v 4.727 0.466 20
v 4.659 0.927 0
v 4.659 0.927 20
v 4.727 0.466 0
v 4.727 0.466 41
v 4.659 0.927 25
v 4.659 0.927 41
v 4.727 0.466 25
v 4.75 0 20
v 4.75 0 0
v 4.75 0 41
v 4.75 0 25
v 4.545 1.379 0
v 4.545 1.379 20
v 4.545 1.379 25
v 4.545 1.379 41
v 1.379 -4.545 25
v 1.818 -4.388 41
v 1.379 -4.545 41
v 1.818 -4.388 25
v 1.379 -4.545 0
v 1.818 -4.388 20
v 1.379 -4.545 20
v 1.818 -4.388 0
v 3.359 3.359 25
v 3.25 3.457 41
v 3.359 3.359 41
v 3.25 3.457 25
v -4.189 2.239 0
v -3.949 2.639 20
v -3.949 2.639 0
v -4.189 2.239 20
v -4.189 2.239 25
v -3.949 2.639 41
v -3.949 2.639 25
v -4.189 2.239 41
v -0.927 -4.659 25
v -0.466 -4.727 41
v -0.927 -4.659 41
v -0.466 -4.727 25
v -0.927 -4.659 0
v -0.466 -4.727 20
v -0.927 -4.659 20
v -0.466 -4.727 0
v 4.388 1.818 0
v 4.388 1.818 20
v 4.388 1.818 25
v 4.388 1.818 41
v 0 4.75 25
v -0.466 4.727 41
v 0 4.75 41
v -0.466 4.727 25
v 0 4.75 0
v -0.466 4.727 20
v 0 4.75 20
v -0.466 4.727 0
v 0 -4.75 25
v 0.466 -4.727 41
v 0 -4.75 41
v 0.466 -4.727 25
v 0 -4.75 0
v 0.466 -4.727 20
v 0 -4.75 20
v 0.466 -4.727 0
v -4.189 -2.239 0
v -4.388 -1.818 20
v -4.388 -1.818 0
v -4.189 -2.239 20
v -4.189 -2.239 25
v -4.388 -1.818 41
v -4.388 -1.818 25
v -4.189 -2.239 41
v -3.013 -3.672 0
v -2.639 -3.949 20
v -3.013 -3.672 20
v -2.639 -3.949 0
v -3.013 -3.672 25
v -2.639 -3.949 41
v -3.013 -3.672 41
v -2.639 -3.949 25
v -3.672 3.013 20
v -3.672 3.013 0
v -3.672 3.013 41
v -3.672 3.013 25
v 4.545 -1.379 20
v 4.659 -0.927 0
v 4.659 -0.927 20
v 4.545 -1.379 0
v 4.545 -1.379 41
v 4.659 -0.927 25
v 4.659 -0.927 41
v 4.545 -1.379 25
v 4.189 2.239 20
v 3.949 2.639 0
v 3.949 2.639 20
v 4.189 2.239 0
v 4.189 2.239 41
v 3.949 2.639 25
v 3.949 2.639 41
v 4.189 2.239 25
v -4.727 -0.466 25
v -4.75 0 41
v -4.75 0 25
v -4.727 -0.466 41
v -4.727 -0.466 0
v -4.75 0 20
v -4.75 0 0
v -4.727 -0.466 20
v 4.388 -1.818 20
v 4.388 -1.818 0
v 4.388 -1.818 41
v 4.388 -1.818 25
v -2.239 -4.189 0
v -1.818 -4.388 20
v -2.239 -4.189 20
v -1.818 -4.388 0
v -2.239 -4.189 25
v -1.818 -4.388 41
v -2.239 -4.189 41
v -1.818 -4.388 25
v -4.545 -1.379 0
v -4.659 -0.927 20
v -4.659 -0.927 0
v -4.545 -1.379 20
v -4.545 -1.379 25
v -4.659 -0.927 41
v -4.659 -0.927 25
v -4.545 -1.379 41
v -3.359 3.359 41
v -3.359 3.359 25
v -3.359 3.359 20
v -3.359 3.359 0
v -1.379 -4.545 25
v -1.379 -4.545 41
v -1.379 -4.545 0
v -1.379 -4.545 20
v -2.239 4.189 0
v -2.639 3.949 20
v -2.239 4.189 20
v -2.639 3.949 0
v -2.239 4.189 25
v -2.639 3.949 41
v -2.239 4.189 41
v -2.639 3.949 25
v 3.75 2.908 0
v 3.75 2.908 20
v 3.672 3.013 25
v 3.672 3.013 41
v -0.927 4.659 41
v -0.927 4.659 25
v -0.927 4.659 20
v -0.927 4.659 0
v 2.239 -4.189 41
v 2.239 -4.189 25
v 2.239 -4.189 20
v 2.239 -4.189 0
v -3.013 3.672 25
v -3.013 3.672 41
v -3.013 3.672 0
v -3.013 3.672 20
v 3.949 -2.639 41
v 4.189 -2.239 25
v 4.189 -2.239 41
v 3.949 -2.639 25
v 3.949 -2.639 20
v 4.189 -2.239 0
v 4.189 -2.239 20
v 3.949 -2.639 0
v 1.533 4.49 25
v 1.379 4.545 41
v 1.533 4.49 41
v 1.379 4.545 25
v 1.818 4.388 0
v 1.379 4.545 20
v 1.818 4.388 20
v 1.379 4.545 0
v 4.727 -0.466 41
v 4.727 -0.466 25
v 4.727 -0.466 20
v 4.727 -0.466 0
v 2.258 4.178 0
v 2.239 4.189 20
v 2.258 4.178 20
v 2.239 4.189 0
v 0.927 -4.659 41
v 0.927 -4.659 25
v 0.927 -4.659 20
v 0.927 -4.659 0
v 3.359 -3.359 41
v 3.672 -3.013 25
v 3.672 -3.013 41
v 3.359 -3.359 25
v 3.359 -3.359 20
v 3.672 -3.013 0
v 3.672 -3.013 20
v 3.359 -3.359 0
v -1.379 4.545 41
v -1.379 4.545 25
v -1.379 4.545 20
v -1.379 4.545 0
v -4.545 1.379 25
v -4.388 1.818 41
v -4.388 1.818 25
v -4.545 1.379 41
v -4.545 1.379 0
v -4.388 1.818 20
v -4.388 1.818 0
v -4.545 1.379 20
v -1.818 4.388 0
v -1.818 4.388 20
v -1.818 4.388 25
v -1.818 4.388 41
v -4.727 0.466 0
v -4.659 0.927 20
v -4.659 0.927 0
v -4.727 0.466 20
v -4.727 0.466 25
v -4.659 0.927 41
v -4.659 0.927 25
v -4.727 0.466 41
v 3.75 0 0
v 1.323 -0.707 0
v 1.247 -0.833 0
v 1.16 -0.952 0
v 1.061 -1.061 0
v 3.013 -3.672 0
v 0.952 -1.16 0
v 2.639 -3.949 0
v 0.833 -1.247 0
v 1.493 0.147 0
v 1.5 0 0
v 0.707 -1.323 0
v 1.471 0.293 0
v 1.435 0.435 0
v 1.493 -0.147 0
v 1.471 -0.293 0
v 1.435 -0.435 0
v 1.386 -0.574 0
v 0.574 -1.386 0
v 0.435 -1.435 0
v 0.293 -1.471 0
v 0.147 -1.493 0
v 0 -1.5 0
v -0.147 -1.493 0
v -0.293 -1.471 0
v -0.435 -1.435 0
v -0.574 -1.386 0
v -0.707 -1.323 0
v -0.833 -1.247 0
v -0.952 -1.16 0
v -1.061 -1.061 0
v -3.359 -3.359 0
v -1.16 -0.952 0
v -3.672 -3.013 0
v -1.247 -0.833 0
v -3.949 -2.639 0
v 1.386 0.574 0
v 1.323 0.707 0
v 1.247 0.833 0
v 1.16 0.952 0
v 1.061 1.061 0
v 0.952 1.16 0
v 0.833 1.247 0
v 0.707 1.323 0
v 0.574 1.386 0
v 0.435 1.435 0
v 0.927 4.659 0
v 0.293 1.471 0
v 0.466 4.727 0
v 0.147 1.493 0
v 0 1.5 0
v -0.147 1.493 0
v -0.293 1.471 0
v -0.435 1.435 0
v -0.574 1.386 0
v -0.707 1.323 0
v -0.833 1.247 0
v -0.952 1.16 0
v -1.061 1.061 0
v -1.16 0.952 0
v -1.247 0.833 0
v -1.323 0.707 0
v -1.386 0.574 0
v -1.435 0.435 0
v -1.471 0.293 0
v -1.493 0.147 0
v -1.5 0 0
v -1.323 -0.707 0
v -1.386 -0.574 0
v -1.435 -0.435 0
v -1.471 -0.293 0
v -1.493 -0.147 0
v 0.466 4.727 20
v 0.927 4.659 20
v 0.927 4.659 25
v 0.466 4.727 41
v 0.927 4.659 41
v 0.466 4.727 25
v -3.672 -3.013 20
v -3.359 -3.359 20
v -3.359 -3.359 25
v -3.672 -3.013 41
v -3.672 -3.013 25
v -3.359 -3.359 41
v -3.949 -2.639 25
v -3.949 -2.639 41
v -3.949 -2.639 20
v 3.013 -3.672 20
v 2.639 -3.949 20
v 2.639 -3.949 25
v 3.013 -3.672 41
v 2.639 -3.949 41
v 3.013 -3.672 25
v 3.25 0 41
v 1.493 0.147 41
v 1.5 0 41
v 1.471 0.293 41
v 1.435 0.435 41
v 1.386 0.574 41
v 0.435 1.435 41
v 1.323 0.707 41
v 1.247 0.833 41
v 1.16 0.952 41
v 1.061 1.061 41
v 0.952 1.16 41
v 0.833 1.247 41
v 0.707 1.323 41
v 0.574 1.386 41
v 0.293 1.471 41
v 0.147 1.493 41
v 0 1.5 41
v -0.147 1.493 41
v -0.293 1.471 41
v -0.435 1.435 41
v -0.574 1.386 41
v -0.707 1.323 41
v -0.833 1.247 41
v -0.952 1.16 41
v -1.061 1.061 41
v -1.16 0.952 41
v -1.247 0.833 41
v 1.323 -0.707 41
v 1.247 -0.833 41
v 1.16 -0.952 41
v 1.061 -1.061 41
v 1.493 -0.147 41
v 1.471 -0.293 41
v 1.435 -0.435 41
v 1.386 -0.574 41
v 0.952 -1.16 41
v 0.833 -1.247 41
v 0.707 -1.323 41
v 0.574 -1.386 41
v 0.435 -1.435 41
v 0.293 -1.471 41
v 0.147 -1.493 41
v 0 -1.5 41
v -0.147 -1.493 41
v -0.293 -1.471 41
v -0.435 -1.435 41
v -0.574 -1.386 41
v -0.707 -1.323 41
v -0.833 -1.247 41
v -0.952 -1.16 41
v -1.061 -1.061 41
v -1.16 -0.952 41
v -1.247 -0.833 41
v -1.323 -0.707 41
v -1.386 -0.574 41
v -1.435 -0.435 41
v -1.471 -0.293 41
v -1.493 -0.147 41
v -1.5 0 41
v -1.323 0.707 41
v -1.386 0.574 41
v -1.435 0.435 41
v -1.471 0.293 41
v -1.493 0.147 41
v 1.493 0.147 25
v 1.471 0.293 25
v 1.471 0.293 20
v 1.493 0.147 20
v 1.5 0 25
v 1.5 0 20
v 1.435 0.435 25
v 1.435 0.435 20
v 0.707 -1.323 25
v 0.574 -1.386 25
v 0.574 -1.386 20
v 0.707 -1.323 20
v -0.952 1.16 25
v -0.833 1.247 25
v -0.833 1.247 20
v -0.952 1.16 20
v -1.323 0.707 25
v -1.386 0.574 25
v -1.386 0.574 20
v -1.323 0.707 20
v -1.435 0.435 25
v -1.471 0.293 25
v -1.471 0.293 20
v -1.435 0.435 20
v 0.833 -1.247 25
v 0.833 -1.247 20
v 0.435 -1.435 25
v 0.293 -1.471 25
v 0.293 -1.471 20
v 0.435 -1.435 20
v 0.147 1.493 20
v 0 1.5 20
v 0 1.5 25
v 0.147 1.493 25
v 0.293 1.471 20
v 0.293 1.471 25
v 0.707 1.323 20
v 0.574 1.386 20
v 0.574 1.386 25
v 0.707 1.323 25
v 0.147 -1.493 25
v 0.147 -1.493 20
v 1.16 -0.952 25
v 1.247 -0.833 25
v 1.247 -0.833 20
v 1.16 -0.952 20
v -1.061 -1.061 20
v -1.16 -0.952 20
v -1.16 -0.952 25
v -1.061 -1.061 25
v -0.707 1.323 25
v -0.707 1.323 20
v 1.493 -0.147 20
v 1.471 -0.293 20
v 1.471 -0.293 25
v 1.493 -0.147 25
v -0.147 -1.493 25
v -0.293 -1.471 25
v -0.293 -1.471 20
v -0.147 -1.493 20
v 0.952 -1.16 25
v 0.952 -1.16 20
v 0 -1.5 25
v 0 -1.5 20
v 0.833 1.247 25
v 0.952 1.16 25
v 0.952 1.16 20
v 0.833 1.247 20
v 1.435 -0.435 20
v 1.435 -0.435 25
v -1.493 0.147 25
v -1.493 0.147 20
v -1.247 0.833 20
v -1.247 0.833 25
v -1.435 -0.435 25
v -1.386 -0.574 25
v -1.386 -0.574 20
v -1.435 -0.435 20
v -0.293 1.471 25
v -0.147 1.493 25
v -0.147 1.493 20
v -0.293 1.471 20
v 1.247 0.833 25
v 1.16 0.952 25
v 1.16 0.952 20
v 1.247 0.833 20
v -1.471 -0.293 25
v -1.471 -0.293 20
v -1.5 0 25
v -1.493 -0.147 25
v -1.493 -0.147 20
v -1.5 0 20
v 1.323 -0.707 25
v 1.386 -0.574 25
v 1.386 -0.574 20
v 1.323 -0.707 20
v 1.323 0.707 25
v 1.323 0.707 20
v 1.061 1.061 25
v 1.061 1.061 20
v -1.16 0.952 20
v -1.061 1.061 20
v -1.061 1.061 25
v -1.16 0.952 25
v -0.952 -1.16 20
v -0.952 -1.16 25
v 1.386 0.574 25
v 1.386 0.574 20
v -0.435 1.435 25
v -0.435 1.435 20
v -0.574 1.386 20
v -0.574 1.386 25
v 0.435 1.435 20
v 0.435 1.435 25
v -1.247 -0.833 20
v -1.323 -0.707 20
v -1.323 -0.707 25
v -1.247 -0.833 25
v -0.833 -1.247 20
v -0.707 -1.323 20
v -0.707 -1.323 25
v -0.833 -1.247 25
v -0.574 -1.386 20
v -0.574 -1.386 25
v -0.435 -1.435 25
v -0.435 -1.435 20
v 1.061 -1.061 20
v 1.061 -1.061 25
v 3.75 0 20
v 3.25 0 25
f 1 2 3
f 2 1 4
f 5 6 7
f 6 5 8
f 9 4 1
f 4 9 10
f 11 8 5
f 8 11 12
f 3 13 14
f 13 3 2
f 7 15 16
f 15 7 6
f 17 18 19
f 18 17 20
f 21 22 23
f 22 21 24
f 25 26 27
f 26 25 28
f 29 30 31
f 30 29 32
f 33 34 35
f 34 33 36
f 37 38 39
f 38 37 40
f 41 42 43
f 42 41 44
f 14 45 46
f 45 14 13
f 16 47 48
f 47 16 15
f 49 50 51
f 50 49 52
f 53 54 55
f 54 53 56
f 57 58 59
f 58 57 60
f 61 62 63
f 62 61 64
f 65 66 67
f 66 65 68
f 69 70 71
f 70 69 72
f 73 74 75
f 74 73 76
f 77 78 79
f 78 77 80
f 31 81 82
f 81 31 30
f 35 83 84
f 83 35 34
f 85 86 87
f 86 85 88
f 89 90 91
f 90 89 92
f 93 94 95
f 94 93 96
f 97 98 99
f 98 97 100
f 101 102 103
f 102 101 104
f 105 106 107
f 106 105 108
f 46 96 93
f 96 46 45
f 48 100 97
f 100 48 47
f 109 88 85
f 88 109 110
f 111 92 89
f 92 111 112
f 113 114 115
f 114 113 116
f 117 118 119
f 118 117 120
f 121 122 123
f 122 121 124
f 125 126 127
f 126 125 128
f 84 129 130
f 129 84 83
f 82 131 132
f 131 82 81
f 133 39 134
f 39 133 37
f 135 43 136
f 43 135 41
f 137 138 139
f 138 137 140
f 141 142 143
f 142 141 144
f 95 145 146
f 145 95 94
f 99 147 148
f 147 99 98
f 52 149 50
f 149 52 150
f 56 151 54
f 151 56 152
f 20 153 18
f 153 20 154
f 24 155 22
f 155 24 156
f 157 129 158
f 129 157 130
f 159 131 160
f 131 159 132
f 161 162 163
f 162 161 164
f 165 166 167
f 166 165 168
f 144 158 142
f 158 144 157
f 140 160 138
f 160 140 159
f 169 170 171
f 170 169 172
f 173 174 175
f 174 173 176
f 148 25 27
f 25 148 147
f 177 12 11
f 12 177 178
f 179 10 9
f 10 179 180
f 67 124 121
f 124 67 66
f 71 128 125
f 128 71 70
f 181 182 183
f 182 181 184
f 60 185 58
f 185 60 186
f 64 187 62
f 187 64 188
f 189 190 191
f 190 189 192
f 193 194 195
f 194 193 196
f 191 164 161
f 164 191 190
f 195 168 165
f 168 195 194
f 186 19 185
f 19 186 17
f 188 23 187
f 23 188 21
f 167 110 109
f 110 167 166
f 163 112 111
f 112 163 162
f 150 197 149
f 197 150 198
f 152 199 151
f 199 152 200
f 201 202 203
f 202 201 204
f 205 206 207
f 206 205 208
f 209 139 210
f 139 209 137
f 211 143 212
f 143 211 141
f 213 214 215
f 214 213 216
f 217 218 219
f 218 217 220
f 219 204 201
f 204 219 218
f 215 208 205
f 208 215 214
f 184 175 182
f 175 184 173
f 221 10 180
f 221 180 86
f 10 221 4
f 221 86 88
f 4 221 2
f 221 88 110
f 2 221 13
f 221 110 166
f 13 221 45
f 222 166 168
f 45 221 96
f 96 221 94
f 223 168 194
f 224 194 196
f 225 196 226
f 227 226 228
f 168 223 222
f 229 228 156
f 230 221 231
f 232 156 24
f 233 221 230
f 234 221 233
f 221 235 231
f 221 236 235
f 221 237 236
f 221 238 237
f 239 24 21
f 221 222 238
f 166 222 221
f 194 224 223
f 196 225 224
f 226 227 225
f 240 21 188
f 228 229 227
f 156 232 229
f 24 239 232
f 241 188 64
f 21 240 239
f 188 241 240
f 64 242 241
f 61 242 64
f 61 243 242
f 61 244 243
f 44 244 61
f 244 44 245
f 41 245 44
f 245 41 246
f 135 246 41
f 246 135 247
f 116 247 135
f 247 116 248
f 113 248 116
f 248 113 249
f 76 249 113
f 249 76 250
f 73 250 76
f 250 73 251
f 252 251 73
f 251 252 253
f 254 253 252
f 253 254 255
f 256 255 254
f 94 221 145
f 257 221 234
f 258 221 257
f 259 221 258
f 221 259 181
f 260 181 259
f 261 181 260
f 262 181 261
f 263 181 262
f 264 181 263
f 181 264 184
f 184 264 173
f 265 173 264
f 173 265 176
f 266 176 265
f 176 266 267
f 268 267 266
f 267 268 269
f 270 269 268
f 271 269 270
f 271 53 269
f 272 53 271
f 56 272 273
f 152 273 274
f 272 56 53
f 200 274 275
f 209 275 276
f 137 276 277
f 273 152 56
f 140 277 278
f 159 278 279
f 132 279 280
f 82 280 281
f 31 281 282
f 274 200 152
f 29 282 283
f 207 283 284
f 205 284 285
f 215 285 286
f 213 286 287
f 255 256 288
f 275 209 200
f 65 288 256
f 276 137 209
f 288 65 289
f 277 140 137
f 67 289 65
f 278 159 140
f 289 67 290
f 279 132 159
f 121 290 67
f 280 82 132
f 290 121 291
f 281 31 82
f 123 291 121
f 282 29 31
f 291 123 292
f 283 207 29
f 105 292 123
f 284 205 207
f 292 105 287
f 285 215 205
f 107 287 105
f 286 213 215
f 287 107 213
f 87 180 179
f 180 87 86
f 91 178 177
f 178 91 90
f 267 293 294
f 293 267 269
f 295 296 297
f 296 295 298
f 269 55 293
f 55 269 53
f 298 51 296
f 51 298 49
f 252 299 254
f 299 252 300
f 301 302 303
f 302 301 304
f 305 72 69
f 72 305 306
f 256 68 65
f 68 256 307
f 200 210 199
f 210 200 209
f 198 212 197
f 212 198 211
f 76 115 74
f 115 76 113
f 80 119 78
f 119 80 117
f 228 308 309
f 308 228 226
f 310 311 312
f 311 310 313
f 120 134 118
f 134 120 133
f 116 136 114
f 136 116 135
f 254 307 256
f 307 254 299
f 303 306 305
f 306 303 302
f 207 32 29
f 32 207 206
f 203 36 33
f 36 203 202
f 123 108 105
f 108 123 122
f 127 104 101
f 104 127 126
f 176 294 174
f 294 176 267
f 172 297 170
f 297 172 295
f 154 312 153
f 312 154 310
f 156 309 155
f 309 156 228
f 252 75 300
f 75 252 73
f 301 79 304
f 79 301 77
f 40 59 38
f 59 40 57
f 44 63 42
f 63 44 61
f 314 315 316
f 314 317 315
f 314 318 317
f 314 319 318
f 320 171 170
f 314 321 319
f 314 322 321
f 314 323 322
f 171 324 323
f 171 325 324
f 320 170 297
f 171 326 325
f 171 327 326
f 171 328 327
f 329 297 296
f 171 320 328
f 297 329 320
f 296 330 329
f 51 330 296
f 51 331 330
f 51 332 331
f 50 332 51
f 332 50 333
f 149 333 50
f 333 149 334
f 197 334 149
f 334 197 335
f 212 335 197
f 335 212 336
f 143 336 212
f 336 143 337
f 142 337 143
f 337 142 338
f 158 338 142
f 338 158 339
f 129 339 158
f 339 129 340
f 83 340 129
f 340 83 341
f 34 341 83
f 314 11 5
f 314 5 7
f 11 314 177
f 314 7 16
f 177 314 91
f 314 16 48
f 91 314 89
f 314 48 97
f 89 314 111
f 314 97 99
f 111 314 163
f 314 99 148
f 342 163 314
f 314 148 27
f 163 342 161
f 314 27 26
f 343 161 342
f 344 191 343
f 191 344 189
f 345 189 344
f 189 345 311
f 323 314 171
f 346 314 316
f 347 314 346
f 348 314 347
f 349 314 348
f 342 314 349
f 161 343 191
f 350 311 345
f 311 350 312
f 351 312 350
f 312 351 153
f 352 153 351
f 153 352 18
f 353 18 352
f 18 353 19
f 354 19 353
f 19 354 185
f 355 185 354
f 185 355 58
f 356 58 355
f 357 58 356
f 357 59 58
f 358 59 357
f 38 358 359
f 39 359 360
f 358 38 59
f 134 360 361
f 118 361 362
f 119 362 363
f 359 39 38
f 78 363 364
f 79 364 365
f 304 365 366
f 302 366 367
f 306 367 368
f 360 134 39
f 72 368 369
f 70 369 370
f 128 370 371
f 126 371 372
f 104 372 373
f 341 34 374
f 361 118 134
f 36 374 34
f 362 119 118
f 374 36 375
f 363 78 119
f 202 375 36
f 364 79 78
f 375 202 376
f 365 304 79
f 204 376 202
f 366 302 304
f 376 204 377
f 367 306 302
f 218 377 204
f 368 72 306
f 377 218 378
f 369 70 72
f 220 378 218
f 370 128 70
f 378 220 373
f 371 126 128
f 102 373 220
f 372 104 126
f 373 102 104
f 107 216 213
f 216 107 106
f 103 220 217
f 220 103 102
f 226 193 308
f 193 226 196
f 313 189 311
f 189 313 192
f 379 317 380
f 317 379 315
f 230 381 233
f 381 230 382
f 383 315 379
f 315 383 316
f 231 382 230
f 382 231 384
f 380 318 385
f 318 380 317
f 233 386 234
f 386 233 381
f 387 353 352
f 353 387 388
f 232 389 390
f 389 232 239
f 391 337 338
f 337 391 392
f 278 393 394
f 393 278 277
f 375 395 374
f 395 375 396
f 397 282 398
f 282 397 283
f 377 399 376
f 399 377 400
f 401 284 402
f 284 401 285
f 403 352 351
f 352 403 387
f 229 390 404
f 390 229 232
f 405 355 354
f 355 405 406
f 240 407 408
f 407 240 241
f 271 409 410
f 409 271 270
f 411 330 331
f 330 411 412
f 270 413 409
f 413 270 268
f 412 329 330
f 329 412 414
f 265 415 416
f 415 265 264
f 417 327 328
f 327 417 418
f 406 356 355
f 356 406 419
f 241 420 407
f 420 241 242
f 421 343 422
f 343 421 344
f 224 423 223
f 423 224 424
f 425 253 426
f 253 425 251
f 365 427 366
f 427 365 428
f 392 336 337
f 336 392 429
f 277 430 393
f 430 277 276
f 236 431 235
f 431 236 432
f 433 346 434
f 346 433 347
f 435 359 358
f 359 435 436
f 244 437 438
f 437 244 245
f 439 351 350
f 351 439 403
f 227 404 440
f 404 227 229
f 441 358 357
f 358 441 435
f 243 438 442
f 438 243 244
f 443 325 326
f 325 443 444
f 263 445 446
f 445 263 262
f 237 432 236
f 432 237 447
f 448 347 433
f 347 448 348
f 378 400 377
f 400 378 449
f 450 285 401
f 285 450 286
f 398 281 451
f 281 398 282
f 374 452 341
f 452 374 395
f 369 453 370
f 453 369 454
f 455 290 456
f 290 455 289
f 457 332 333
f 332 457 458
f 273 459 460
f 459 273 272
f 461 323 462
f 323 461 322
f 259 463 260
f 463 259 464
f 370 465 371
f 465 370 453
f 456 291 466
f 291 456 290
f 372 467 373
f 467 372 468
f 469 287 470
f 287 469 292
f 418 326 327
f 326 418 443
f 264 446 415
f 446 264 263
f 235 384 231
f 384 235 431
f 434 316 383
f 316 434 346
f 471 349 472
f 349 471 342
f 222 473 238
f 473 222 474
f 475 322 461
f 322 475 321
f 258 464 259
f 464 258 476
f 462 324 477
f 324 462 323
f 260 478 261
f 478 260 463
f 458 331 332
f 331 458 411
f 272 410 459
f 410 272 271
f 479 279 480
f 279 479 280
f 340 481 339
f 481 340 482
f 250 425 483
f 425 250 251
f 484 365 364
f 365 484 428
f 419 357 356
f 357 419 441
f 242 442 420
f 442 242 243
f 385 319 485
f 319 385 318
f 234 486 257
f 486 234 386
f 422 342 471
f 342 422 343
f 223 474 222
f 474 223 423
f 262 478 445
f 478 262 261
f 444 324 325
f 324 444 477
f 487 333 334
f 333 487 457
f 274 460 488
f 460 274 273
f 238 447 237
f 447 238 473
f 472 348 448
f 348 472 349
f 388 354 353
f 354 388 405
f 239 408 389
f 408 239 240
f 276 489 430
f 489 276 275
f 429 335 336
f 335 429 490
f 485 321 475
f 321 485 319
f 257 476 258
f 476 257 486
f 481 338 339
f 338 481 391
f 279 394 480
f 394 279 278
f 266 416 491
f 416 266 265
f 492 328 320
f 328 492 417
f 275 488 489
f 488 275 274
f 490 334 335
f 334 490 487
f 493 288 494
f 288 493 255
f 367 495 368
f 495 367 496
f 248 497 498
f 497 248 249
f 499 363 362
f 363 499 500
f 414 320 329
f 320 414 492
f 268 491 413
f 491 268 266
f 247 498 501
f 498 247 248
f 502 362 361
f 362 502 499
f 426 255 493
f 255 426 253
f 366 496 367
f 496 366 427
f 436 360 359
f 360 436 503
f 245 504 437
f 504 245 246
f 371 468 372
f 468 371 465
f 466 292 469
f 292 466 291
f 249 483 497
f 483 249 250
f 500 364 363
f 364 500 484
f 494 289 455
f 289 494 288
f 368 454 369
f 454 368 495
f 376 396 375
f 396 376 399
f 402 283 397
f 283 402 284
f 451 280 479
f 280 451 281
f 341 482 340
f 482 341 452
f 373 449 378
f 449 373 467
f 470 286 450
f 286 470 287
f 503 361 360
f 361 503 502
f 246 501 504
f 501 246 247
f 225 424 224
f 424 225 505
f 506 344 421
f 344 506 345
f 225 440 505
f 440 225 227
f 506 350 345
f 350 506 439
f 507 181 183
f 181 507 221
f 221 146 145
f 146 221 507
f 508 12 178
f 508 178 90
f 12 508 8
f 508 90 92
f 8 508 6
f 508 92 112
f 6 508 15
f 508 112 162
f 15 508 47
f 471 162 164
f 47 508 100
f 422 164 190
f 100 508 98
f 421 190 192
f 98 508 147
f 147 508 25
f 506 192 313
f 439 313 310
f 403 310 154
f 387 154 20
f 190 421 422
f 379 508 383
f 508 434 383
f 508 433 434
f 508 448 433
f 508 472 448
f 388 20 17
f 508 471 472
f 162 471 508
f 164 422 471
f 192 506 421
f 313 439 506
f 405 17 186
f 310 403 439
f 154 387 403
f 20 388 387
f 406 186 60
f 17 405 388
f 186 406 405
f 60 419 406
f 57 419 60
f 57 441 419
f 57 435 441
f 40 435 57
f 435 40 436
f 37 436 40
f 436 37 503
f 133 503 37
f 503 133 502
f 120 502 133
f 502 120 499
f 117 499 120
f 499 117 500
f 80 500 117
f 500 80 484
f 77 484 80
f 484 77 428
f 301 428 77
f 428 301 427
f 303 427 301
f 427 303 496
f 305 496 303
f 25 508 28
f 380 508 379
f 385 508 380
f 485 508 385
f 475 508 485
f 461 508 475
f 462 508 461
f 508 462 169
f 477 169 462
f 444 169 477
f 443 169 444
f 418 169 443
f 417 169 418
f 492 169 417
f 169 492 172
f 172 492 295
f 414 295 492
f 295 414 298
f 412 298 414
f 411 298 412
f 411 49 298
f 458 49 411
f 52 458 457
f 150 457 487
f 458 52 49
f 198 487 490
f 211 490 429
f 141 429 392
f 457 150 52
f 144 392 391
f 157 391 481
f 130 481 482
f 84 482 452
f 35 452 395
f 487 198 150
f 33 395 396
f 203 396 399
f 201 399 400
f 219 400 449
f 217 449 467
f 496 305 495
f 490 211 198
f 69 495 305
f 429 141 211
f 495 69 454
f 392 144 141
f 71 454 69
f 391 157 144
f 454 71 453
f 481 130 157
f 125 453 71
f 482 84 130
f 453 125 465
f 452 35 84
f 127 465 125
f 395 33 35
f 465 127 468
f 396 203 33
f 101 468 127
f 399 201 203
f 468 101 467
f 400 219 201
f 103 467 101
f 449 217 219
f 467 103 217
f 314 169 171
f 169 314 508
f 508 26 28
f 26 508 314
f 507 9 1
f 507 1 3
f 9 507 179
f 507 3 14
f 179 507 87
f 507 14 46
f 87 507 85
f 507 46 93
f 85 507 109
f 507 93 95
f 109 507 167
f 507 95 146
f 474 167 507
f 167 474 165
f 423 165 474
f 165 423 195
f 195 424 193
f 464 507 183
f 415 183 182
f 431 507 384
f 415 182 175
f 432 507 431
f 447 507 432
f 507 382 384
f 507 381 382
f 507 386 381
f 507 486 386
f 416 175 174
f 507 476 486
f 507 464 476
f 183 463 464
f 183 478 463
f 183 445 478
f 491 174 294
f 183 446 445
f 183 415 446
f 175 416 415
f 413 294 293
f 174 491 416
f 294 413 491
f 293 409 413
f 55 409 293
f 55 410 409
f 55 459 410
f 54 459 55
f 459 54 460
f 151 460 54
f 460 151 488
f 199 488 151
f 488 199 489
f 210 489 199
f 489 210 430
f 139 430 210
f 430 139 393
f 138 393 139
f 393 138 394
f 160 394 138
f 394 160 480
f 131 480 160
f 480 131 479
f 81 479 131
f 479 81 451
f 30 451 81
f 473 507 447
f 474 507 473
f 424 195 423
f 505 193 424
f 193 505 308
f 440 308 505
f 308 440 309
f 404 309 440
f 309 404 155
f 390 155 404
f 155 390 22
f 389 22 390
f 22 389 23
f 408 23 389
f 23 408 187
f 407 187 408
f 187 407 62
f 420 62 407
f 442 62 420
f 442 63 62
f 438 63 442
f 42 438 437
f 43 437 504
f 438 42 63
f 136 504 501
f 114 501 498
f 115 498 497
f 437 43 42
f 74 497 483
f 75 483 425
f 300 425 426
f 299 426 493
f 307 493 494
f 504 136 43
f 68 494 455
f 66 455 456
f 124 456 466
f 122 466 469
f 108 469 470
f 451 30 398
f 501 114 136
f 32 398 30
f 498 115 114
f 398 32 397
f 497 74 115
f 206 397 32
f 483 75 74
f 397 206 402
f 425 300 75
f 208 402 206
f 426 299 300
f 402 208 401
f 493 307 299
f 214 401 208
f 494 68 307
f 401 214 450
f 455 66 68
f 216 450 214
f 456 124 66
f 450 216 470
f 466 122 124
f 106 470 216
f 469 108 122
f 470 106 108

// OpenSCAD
// Hose-Barb Reducer Design
// Units: mm
// Orientation: Standing upright on XY plane, building +Z

// --- Dimensions ---
// Main bore diameter
$main_bore_d = 3.0;
$main_bore_r = $main_bore_d / 2.0;

// Section 1: 8mm Tubing Interface (z=0 to z=20)
$sec1_start_z = 0;
$sec1_end_z = 20;
$sec1_barb_height = 10;
$sec1_barb_bottom_od = 7.5;
$sec1_barb_top_od = 9.5;
$sec1_barb_count = 2;
$sec1_barb_spacing = 12; // Center-to-center distance between barbs

// Section 2: Collar (z=20 to z=25)
$sec2_start_z = 20;
$sec2_end_z = 25;
$sec2_collar_od = 12;
$sec2_collar_id = $main_bore_d; // Matches main bore

// Section 3: 5mm Tubing Interface (z=25 to z=41)
$sec3_start_z = 25;
$sec3_end_z = 41;
$sec3_barb_height = 8;
$sec3_barb_bottom_od = 6.5;
$sec3_barb_top_od = 5.0;
$sec3_barb_count = 2;
$sec3_barb_spacing = 10; // Center-to-center distance between barbs

// --- Helper Functions ---
// Function to create a single tapered barb profile
// Returns a polygon path for linear_extrude
function create_barb_profile(z_start, z_end, r_bottom, r_top, r_inner) = 
    [
        [0, 0], // Start at center bottom (will be offset by translate)
        [r_bottom, 0],
        [r_bottom, z_end - z_start],
        [r_top, z_end - z_start],
        [r_top, z_end - z_start + 1], // Step out slightly for printability
        [r_bottom, z_end - z_start + 1],
        [0, z_end - z_start + 1]
    ];

// Function to create the stepped return profile for the barb
// This creates the "sawtooth" look: taper -> step back -> flat
function create_barb_stepped_profile(z_start, z_end, r_bottom, r_top, r_inner) = 
    [
        [0, 0],
        [r_bottom, 0],
        [r_bottom, z_end - z_start],
        [r_top, z_end - z_start],
        [r_top, z_end - z_start + 0.5], // Step out
        [r_bottom, z_end - z_start + 0.5],
        [0, z_end - z_start + 0.5]
    ];

// --- Main Build ---

difference() {
    // 1. Create the Main Body (Cylinder with central bore)
    // We build the outer shell and subtract the inner bore
    $fn = 64;
    
    // Outer shell of the main body (excluding barbs for now, we'll add them)
    // Actually, let's build the main cylinder first, then add barbs on top, 
    // then subtract the barbs from the main body to create the holes.
    
    // Main Cylinder Body (from z=0 to z=41)
    // We need a large enough OD to cover the widest part of the barbs (9.5mm)
    $max_od = 9.5;
    $max_od_r = $max_od / 2.0;
    
    // Create the main tube body
    translate([0, 0, 0])
    difference() {
        // Outer shell
        cylinder(h = 41, r = $max_od_r, $fn = 64);
        
        // Inner bore through the whole length
        cylinder(h = 41, r = $main_bore_r, $fn = 64);
    }
    
    // 2. Add Section 1 Barbs (8mm tubing)
    // These are added to the main body, then we cut them out to make the holes
    // We place them at z = 0 and z = 10 (stacked)
    for (i = [0, 1]) {
        $z_offset = i * $sec1_barb_height;
        $z_pos = $z_offset;
        
        // Calculate radius at the bottom of the barb (z=0) and top (z=10)
        // The profile grows from 7.5 to 9.5 over 10mm
        $r_bottom = $sec1_barb_bottom_od / 2.0;
        $r_top = $sec1_barb_top_od / 2.0;
        
        // Create the barb shape
        translate([0, 0, $z_pos])
        difference() {
            // The solid barb to be added
            // We use a polygon extrusion to get the tapered shape
            // Path: Bottom radius -> Top radius -> Step back -> Bottom radius
            // Note: The "step back" creates the flat top surface for the tube
            
            // Define the profile points relative to the barb base
            $h = $sec1_barb_height;
            $step_h = 0.5; // Height of the flat top
            
            $pts = [
                [$r_bottom, 0],
                [$r_bottom, $h],
                [$r_top, $h],
                [$r_top, $h + $step_h],
                [$r_bottom, $h + $step_h],
                [0, $h + $step_h]
            ];
            
            // Extrude the profile
            linear_extrude(height = $h + $step_h, center = false, convexity = 3)
            polygon(points = $pts);
            
            // Cut the main bore through the barb
            cylinder(h = $h + $step_h, r = $main_bore_r, $fn = 64);
        }
    }
    
    // 3. Add Section 2 Collar (z=20 to z=25)
    // This is just a thickening of the main body, no cutting needed as it's solid
    // We can model this by adding a cylinder on top of the main body
    // But since we are in a difference() block, we need to add it to the union of the main body.
    // However, the main body is already defined. 
    // To simplify, let's just ensure the main cylinder is tall enough (it is, 41mm).
    // The collar is just the main body OD expanded from 9.5 to 12mm in that region.
    
    // Let's rebuild the main body logic to include the collar expansion properly.
    // Instead of one big cylinder, let's use a union of sections or modify the main cylinder.
    // Easiest way in this structure: Add the collar as a separate positive shape.
    
    translate([0, 0, $sec2_start_z])
    cylinder(h = $sec2_end_z - $sec2_start_z, r = $sec2_collar_od / 2.0, $fn = 64);
    
    // 4. Add Section 3 Barbs (5mm tubing)
    // Placed at z = 25 and z = 33 (stacked)
    for (i = [0, 1]) {
        $z_offset = i * $sec3_barb_height;
        $z_pos = $sec3_start_z + $z_offset;
        
        // Profile shrinks from 6.5 to 5.0 over 8mm
        $r_bottom = $sec3_barb_bottom_od / 2.0;
        $r_top = $sec3_barb_top_od / 2.0;
        
        translate([0, 0, $z_pos])
        difference() {
            // Solid barb shape
            $h = $sec3_barb_height;
            $step_h = 0.5;
            
            $pts = [
                [$r_bottom, 0],
                [$r_bottom, $h],
                [$r_top, $h],
                [$r_top, $h + $step_h],
                [$r_bottom, $h + $step_h],
                [0, $h + $step_h]
            ];
            
            linear_extrude(height = $h + $step_h, center = false, convexity = 3)
            polygon(points = $pts);
            
            // Cut the main bore
            cylinder(h = $h + $step_h, r = $main_bore_r, $fn = 64);
        }
    }
}
